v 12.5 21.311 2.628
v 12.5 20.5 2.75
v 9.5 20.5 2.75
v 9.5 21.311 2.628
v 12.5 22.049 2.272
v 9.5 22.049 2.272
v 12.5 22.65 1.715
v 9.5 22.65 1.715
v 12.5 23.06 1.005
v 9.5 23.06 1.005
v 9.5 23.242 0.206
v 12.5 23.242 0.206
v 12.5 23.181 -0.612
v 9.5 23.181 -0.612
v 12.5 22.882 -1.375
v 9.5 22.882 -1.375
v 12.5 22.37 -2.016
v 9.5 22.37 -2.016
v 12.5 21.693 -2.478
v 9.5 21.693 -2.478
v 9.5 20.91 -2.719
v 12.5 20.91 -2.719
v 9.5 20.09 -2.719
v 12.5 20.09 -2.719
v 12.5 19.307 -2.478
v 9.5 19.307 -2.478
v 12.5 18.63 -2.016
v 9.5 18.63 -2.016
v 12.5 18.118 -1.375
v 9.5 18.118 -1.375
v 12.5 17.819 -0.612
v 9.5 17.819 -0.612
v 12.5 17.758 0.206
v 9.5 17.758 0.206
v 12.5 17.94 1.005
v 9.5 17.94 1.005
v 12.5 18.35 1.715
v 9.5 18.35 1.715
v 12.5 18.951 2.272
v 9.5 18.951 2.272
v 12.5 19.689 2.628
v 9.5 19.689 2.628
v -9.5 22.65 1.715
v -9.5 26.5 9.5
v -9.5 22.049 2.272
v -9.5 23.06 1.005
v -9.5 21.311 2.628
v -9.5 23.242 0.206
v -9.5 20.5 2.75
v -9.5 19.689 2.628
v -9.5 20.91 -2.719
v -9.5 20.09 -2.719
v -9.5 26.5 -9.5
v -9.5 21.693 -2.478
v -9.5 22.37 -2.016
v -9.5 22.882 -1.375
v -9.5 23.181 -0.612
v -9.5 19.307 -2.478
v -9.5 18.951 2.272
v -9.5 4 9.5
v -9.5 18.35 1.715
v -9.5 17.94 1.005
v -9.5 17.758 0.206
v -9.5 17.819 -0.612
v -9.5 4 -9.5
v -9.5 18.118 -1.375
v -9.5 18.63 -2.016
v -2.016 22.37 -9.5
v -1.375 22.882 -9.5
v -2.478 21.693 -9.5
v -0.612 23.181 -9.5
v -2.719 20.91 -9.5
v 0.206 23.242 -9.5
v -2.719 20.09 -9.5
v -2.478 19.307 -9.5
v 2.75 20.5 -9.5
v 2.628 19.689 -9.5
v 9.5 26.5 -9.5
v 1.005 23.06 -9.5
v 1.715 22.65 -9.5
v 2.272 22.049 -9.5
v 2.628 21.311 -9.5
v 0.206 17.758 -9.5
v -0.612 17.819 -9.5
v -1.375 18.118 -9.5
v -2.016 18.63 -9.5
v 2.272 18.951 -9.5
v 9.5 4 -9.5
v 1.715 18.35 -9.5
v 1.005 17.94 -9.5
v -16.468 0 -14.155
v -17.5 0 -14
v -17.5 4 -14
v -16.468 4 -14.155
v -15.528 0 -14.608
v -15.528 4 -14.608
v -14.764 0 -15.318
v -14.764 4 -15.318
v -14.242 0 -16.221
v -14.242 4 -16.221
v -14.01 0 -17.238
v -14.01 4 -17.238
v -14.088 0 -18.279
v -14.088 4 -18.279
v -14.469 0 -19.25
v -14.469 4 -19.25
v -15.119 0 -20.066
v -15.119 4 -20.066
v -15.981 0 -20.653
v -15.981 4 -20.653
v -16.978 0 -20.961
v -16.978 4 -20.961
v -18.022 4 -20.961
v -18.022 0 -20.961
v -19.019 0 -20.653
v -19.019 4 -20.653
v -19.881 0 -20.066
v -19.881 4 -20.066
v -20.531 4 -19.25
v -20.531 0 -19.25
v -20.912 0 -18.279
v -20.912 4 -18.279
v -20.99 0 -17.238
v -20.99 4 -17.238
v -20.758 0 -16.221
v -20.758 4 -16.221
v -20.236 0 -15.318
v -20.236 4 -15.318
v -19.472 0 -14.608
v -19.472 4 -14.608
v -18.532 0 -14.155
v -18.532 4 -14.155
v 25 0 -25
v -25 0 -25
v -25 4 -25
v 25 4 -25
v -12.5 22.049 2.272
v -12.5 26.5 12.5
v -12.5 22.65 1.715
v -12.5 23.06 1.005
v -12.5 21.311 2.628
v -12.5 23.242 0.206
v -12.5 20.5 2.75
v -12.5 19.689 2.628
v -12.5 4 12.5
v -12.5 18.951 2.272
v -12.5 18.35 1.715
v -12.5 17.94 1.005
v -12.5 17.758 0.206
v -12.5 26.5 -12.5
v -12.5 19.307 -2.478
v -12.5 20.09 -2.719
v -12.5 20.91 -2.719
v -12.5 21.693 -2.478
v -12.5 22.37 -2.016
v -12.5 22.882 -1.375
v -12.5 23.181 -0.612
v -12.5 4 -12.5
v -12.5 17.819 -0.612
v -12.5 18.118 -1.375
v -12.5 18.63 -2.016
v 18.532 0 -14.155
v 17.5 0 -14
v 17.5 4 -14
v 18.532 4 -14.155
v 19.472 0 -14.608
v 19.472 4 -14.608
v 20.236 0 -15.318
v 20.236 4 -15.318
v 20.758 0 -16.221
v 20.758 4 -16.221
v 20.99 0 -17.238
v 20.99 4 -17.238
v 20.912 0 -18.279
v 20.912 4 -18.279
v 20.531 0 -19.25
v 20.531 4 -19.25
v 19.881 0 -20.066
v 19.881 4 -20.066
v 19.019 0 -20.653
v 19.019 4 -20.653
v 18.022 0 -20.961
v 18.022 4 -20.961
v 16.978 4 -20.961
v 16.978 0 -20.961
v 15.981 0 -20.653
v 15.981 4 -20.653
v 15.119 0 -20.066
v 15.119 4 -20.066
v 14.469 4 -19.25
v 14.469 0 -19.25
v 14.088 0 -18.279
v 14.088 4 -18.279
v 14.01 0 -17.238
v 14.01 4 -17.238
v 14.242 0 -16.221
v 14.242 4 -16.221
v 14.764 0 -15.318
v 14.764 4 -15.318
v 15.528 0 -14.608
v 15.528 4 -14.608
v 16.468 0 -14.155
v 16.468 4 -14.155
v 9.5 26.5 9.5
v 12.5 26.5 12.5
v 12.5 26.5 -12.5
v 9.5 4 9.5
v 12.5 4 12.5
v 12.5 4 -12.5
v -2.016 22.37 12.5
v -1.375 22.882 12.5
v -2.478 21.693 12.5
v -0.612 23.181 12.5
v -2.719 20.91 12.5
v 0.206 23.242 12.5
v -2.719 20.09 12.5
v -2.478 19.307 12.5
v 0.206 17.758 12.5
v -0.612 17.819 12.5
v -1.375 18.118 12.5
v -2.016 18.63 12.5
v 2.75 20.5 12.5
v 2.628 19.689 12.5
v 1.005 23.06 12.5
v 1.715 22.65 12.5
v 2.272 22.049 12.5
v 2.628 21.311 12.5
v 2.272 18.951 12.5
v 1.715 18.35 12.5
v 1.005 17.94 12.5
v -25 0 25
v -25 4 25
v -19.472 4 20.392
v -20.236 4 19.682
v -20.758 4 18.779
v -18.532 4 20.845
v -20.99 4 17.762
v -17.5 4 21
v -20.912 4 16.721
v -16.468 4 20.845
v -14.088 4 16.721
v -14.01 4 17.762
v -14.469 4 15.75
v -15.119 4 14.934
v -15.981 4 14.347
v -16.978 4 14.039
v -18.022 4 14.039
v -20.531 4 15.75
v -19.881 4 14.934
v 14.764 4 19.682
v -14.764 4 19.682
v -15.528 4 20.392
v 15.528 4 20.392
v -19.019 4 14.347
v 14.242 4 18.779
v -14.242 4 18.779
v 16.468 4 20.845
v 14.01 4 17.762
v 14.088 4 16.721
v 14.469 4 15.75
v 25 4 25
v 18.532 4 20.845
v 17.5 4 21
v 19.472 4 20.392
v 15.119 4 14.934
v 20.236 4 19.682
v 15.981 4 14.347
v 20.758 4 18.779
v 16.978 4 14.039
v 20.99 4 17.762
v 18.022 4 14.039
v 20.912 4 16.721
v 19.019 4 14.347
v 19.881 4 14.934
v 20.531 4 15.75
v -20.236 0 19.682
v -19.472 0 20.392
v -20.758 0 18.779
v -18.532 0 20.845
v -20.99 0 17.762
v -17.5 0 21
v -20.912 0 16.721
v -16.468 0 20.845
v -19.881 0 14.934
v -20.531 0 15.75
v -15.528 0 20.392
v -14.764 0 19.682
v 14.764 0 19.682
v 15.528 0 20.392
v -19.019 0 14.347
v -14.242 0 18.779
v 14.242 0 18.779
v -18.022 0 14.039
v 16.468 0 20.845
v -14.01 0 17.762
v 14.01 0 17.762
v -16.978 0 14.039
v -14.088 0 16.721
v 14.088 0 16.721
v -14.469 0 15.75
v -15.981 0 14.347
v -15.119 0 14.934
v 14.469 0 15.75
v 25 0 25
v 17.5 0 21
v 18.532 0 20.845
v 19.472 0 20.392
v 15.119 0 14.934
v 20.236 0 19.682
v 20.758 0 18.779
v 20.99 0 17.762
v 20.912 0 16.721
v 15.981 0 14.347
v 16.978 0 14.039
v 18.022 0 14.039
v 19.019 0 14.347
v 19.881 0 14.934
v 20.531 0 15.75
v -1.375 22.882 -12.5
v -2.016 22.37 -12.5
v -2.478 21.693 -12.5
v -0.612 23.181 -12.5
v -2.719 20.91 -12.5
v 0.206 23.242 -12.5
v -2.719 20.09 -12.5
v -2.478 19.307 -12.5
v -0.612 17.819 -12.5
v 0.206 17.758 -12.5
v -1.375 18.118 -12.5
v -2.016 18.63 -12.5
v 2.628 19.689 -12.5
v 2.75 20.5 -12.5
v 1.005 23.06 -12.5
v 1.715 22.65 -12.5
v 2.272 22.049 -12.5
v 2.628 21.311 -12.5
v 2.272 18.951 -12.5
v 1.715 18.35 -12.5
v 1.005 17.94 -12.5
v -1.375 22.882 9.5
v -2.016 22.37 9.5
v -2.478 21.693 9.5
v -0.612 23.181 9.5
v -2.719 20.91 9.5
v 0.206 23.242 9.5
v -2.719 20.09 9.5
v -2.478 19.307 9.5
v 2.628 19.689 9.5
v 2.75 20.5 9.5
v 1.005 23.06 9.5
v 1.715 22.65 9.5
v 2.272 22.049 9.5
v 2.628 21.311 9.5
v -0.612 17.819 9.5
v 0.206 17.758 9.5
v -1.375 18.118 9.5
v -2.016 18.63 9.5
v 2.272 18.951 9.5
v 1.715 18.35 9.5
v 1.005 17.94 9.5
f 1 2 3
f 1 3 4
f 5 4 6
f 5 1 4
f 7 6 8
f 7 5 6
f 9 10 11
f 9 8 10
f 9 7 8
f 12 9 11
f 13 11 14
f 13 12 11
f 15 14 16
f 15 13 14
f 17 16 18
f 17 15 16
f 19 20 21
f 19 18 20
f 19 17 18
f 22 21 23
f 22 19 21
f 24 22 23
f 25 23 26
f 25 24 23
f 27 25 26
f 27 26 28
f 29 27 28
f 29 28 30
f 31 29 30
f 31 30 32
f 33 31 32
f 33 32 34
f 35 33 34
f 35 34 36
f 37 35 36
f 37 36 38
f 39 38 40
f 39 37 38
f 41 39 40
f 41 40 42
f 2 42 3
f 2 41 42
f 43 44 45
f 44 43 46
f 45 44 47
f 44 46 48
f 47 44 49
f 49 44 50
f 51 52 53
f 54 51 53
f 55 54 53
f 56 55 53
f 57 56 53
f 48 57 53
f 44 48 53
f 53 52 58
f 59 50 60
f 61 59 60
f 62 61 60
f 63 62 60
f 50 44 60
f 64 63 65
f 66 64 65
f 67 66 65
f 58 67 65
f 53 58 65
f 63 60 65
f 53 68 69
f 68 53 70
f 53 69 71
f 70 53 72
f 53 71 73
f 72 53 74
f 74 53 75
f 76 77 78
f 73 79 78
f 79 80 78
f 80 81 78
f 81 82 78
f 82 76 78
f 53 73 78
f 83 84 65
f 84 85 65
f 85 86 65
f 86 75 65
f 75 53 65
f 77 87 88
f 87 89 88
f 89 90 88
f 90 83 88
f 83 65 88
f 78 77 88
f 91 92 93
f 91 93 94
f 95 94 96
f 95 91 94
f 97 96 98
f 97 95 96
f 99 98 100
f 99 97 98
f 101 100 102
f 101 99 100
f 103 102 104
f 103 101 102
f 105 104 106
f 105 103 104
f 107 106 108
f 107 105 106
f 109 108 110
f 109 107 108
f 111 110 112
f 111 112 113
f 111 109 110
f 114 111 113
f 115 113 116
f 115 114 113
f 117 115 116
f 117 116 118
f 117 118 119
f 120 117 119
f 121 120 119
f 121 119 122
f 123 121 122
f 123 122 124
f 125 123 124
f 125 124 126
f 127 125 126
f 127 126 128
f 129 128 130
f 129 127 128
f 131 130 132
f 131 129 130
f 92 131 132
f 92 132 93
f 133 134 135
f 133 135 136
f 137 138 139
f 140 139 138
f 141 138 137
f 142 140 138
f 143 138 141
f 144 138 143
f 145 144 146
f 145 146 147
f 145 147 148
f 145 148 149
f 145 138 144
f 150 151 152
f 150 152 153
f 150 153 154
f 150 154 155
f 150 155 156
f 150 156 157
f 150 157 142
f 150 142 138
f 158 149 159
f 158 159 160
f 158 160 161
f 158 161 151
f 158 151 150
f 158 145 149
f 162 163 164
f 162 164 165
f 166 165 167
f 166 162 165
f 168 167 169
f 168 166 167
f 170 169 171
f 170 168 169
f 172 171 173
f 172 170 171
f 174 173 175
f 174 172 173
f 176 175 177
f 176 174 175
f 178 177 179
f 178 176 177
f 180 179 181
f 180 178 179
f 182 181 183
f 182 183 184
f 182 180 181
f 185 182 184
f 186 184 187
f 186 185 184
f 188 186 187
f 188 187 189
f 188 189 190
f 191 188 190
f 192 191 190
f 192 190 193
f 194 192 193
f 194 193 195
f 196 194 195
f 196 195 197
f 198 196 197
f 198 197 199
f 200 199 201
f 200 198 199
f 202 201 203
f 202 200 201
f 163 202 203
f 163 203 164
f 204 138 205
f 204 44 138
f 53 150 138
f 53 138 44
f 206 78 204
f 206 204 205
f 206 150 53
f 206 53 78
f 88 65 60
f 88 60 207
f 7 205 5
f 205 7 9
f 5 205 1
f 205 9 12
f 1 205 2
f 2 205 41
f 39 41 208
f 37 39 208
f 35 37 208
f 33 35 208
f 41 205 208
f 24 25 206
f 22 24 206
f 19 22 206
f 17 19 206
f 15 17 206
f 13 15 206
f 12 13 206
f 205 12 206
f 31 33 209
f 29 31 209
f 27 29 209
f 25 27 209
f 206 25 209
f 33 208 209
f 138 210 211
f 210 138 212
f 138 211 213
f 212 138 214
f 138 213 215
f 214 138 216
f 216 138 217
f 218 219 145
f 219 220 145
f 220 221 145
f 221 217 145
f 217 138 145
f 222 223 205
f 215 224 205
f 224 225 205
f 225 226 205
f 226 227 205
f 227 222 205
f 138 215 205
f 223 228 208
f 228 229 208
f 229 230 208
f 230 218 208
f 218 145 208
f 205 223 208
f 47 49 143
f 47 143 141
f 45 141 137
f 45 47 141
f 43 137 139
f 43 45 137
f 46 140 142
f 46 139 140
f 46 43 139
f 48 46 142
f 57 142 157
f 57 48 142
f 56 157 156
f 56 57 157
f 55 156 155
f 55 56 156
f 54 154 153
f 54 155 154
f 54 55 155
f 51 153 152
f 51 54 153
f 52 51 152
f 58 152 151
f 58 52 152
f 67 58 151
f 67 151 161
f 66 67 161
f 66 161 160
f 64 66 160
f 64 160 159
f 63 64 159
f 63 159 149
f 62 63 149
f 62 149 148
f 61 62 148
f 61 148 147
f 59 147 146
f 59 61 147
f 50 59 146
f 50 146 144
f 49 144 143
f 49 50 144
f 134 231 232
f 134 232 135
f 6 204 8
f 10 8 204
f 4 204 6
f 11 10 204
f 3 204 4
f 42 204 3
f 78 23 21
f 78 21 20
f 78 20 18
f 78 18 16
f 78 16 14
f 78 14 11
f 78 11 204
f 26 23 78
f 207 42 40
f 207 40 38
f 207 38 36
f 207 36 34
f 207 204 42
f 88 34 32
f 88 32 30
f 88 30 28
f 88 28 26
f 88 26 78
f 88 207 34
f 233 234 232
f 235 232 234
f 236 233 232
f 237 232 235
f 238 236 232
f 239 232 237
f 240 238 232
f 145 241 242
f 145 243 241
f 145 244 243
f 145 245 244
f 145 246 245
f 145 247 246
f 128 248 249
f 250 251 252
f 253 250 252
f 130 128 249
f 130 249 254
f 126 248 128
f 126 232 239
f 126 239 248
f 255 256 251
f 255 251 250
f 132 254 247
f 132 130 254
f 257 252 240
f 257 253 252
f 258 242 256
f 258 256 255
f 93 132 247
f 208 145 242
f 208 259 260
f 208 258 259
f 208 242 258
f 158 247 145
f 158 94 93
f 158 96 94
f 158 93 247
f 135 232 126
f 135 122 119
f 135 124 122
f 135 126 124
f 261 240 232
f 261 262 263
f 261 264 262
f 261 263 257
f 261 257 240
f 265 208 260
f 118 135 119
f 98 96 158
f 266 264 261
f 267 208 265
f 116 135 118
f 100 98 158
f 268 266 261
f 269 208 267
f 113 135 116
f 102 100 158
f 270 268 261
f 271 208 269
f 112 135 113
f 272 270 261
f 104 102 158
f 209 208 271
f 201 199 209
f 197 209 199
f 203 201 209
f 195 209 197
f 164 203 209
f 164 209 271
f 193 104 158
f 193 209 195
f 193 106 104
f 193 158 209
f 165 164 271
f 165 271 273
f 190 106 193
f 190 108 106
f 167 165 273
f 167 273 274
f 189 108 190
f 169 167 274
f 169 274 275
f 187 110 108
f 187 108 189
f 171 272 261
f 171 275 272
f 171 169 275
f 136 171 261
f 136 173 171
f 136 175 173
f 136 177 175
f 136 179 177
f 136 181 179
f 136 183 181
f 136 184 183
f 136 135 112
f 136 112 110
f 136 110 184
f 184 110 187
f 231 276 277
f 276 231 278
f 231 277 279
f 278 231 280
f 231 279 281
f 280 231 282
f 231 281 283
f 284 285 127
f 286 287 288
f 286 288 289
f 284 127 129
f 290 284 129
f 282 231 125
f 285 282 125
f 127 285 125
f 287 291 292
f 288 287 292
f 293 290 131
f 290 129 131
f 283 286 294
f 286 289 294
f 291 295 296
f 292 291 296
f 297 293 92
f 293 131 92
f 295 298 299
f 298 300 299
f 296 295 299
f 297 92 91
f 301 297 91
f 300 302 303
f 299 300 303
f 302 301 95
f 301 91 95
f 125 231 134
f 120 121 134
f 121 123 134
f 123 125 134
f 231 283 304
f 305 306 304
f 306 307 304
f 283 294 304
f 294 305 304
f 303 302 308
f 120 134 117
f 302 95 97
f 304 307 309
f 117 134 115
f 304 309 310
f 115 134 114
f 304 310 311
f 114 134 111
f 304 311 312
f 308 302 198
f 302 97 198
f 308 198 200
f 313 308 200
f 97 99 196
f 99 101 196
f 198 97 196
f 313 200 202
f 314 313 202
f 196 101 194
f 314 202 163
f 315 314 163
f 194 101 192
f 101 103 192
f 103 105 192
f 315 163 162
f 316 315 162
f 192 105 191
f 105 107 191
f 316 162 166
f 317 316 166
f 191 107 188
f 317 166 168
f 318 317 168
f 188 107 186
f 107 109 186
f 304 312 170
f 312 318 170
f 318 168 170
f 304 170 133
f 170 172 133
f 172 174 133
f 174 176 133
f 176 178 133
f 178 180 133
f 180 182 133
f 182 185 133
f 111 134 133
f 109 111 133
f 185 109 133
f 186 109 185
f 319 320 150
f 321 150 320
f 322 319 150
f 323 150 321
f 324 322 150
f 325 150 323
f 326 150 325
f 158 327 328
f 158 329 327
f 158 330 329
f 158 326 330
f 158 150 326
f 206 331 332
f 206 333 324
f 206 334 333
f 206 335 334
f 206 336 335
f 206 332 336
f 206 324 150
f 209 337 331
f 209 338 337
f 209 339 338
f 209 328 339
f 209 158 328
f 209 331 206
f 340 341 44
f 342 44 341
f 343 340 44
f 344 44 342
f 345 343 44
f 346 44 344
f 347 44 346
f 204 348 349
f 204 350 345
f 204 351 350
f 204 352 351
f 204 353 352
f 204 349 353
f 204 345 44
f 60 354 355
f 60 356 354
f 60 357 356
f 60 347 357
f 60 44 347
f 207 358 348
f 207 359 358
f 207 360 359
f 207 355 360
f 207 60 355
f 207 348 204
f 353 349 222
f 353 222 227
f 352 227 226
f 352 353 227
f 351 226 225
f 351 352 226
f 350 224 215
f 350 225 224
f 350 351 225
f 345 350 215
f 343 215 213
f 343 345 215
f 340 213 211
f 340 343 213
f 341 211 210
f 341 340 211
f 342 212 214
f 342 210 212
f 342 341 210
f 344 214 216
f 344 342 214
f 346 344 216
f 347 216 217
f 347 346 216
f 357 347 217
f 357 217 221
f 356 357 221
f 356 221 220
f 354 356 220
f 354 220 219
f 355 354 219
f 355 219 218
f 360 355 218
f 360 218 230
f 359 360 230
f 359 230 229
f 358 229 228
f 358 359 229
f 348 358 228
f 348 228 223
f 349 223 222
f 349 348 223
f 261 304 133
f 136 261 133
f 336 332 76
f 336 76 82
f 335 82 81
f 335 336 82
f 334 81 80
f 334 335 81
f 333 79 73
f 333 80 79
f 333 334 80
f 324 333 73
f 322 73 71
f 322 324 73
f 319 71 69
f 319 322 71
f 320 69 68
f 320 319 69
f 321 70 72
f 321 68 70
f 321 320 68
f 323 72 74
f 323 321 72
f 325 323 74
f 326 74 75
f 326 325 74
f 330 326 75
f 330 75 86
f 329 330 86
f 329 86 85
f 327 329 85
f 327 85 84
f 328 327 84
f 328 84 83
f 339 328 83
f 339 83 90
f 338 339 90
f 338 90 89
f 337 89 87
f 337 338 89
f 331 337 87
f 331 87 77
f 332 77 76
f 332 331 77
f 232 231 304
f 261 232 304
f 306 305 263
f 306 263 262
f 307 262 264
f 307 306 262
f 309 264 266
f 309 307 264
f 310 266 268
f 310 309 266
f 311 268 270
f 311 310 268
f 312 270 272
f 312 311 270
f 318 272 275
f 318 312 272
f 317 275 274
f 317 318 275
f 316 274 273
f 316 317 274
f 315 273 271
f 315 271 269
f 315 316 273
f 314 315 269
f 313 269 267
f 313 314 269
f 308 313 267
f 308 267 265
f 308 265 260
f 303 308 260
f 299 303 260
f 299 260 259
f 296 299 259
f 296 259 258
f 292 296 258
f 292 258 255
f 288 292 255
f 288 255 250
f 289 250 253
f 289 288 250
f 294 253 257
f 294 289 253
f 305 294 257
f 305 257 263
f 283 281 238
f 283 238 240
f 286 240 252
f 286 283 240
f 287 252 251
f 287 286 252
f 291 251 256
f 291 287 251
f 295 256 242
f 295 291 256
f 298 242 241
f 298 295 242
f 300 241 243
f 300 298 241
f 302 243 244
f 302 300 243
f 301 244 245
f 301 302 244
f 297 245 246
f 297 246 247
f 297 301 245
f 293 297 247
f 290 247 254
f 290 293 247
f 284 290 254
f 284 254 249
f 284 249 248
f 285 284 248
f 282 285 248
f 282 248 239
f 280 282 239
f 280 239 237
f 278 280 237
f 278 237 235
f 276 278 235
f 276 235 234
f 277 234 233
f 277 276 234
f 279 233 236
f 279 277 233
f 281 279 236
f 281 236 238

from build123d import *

# Parameters (mm, degrees)
SKETCH1_W               = 50
SKETCH1_H               = 50
SKETCH1_R               = 3.5
BOSS_EXTRUDE1_DEPTH     = 4
SKETCH2_W               = 25
SKETCH2_H               = 25
SKETCH2_W_2             = 19
SKETCH2_H_2             = 19
BOSS_EXTRUDE2_DEPTH     = 22.5
CUT_EXTRUDE1_DEPTH      = 53.282884389
CUT_EXTRUDE1_DEPTH_BACK = 53.282884389
SKETCH3_R               = 2.75
CUT_EXTRUDE2_DEPTH      = 53.282884389
CUT_EXTRUDE2_DEPTH_BACK = 53.282884389
SKETCH4_R               = 2.75


with BuildPart() as part:
    # Sketch1 → Boss-Extrude1 (new body)
    with BuildSketch(Plane(origin=(0, 0, 0), x_dir=(1, 0, 0), z_dir=(0, 1, 0))):
        Rectangle(SKETCH1_W, SKETCH1_H)
        with Locations(Location((-17.5, -17.5, 0), (0, 0, 270))):
            Circle(SKETCH1_R, mode=Mode.SUBTRACT)
        with Locations(Location((17.5, -17.5, 0), (0, 0, 270))):
            Circle(SKETCH1_R, mode=Mode.SUBTRACT)
        with Locations(Location((17.5, 17.5, 0), (0, 0, 270))):
            Circle(SKETCH1_R, mode=Mode.SUBTRACT)
        with Locations(Location((-17.5, 17.5, 0), (0, 0, 270))):
            Circle(SKETCH1_R, mode=Mode.SUBTRACT)
    extrude(amount=BOSS_EXTRUDE1_DEPTH)

    # Sketch2 → Boss-Extrude2 (add)
    with BuildSketch(Plane(origin=(0, 4, 0), x_dir=(1, 0, 0), z_dir=(0, 1, 0))):
        Rectangle(SKETCH2_W, SKETCH2_H)
        Rectangle(SKETCH2_W_2, SKETCH2_H_2, mode=Mode.SUBTRACT)
    extrude(amount=BOSS_EXTRUDE2_DEPTH)

    # Sketch3 → Cut-Extrude1 (cut, two sides: drawn at the far end of the back side and taken through both)
    with BuildSketch(Plane.ZY.offset(12.5).offset(-CUT_EXTRUDE1_DEPTH_BACK)):
        with Locations((0, 20.5)):
            Circle(SKETCH3_R)
    extrude(amount=CUT_EXTRUDE1_DEPTH + CUT_EXTRUDE1_DEPTH_BACK, mode=Mode.SUBTRACT)

    # Sketch4 → Cut-Extrude2 (cut, two sides: drawn at the far end of the back side and taken through both)
    with BuildSketch(Plane.XY.offset(12.5).offset(-CUT_EXTRUDE2_DEPTH_BACK)):
        with Locations((0, 20.5)):
            Circle(SKETCH4_R)
    extrude(amount=CUT_EXTRUDE2_DEPTH + CUT_EXTRUDE2_DEPTH_BACK, mode=Mode.SUBTRACT)


solid = part.part
